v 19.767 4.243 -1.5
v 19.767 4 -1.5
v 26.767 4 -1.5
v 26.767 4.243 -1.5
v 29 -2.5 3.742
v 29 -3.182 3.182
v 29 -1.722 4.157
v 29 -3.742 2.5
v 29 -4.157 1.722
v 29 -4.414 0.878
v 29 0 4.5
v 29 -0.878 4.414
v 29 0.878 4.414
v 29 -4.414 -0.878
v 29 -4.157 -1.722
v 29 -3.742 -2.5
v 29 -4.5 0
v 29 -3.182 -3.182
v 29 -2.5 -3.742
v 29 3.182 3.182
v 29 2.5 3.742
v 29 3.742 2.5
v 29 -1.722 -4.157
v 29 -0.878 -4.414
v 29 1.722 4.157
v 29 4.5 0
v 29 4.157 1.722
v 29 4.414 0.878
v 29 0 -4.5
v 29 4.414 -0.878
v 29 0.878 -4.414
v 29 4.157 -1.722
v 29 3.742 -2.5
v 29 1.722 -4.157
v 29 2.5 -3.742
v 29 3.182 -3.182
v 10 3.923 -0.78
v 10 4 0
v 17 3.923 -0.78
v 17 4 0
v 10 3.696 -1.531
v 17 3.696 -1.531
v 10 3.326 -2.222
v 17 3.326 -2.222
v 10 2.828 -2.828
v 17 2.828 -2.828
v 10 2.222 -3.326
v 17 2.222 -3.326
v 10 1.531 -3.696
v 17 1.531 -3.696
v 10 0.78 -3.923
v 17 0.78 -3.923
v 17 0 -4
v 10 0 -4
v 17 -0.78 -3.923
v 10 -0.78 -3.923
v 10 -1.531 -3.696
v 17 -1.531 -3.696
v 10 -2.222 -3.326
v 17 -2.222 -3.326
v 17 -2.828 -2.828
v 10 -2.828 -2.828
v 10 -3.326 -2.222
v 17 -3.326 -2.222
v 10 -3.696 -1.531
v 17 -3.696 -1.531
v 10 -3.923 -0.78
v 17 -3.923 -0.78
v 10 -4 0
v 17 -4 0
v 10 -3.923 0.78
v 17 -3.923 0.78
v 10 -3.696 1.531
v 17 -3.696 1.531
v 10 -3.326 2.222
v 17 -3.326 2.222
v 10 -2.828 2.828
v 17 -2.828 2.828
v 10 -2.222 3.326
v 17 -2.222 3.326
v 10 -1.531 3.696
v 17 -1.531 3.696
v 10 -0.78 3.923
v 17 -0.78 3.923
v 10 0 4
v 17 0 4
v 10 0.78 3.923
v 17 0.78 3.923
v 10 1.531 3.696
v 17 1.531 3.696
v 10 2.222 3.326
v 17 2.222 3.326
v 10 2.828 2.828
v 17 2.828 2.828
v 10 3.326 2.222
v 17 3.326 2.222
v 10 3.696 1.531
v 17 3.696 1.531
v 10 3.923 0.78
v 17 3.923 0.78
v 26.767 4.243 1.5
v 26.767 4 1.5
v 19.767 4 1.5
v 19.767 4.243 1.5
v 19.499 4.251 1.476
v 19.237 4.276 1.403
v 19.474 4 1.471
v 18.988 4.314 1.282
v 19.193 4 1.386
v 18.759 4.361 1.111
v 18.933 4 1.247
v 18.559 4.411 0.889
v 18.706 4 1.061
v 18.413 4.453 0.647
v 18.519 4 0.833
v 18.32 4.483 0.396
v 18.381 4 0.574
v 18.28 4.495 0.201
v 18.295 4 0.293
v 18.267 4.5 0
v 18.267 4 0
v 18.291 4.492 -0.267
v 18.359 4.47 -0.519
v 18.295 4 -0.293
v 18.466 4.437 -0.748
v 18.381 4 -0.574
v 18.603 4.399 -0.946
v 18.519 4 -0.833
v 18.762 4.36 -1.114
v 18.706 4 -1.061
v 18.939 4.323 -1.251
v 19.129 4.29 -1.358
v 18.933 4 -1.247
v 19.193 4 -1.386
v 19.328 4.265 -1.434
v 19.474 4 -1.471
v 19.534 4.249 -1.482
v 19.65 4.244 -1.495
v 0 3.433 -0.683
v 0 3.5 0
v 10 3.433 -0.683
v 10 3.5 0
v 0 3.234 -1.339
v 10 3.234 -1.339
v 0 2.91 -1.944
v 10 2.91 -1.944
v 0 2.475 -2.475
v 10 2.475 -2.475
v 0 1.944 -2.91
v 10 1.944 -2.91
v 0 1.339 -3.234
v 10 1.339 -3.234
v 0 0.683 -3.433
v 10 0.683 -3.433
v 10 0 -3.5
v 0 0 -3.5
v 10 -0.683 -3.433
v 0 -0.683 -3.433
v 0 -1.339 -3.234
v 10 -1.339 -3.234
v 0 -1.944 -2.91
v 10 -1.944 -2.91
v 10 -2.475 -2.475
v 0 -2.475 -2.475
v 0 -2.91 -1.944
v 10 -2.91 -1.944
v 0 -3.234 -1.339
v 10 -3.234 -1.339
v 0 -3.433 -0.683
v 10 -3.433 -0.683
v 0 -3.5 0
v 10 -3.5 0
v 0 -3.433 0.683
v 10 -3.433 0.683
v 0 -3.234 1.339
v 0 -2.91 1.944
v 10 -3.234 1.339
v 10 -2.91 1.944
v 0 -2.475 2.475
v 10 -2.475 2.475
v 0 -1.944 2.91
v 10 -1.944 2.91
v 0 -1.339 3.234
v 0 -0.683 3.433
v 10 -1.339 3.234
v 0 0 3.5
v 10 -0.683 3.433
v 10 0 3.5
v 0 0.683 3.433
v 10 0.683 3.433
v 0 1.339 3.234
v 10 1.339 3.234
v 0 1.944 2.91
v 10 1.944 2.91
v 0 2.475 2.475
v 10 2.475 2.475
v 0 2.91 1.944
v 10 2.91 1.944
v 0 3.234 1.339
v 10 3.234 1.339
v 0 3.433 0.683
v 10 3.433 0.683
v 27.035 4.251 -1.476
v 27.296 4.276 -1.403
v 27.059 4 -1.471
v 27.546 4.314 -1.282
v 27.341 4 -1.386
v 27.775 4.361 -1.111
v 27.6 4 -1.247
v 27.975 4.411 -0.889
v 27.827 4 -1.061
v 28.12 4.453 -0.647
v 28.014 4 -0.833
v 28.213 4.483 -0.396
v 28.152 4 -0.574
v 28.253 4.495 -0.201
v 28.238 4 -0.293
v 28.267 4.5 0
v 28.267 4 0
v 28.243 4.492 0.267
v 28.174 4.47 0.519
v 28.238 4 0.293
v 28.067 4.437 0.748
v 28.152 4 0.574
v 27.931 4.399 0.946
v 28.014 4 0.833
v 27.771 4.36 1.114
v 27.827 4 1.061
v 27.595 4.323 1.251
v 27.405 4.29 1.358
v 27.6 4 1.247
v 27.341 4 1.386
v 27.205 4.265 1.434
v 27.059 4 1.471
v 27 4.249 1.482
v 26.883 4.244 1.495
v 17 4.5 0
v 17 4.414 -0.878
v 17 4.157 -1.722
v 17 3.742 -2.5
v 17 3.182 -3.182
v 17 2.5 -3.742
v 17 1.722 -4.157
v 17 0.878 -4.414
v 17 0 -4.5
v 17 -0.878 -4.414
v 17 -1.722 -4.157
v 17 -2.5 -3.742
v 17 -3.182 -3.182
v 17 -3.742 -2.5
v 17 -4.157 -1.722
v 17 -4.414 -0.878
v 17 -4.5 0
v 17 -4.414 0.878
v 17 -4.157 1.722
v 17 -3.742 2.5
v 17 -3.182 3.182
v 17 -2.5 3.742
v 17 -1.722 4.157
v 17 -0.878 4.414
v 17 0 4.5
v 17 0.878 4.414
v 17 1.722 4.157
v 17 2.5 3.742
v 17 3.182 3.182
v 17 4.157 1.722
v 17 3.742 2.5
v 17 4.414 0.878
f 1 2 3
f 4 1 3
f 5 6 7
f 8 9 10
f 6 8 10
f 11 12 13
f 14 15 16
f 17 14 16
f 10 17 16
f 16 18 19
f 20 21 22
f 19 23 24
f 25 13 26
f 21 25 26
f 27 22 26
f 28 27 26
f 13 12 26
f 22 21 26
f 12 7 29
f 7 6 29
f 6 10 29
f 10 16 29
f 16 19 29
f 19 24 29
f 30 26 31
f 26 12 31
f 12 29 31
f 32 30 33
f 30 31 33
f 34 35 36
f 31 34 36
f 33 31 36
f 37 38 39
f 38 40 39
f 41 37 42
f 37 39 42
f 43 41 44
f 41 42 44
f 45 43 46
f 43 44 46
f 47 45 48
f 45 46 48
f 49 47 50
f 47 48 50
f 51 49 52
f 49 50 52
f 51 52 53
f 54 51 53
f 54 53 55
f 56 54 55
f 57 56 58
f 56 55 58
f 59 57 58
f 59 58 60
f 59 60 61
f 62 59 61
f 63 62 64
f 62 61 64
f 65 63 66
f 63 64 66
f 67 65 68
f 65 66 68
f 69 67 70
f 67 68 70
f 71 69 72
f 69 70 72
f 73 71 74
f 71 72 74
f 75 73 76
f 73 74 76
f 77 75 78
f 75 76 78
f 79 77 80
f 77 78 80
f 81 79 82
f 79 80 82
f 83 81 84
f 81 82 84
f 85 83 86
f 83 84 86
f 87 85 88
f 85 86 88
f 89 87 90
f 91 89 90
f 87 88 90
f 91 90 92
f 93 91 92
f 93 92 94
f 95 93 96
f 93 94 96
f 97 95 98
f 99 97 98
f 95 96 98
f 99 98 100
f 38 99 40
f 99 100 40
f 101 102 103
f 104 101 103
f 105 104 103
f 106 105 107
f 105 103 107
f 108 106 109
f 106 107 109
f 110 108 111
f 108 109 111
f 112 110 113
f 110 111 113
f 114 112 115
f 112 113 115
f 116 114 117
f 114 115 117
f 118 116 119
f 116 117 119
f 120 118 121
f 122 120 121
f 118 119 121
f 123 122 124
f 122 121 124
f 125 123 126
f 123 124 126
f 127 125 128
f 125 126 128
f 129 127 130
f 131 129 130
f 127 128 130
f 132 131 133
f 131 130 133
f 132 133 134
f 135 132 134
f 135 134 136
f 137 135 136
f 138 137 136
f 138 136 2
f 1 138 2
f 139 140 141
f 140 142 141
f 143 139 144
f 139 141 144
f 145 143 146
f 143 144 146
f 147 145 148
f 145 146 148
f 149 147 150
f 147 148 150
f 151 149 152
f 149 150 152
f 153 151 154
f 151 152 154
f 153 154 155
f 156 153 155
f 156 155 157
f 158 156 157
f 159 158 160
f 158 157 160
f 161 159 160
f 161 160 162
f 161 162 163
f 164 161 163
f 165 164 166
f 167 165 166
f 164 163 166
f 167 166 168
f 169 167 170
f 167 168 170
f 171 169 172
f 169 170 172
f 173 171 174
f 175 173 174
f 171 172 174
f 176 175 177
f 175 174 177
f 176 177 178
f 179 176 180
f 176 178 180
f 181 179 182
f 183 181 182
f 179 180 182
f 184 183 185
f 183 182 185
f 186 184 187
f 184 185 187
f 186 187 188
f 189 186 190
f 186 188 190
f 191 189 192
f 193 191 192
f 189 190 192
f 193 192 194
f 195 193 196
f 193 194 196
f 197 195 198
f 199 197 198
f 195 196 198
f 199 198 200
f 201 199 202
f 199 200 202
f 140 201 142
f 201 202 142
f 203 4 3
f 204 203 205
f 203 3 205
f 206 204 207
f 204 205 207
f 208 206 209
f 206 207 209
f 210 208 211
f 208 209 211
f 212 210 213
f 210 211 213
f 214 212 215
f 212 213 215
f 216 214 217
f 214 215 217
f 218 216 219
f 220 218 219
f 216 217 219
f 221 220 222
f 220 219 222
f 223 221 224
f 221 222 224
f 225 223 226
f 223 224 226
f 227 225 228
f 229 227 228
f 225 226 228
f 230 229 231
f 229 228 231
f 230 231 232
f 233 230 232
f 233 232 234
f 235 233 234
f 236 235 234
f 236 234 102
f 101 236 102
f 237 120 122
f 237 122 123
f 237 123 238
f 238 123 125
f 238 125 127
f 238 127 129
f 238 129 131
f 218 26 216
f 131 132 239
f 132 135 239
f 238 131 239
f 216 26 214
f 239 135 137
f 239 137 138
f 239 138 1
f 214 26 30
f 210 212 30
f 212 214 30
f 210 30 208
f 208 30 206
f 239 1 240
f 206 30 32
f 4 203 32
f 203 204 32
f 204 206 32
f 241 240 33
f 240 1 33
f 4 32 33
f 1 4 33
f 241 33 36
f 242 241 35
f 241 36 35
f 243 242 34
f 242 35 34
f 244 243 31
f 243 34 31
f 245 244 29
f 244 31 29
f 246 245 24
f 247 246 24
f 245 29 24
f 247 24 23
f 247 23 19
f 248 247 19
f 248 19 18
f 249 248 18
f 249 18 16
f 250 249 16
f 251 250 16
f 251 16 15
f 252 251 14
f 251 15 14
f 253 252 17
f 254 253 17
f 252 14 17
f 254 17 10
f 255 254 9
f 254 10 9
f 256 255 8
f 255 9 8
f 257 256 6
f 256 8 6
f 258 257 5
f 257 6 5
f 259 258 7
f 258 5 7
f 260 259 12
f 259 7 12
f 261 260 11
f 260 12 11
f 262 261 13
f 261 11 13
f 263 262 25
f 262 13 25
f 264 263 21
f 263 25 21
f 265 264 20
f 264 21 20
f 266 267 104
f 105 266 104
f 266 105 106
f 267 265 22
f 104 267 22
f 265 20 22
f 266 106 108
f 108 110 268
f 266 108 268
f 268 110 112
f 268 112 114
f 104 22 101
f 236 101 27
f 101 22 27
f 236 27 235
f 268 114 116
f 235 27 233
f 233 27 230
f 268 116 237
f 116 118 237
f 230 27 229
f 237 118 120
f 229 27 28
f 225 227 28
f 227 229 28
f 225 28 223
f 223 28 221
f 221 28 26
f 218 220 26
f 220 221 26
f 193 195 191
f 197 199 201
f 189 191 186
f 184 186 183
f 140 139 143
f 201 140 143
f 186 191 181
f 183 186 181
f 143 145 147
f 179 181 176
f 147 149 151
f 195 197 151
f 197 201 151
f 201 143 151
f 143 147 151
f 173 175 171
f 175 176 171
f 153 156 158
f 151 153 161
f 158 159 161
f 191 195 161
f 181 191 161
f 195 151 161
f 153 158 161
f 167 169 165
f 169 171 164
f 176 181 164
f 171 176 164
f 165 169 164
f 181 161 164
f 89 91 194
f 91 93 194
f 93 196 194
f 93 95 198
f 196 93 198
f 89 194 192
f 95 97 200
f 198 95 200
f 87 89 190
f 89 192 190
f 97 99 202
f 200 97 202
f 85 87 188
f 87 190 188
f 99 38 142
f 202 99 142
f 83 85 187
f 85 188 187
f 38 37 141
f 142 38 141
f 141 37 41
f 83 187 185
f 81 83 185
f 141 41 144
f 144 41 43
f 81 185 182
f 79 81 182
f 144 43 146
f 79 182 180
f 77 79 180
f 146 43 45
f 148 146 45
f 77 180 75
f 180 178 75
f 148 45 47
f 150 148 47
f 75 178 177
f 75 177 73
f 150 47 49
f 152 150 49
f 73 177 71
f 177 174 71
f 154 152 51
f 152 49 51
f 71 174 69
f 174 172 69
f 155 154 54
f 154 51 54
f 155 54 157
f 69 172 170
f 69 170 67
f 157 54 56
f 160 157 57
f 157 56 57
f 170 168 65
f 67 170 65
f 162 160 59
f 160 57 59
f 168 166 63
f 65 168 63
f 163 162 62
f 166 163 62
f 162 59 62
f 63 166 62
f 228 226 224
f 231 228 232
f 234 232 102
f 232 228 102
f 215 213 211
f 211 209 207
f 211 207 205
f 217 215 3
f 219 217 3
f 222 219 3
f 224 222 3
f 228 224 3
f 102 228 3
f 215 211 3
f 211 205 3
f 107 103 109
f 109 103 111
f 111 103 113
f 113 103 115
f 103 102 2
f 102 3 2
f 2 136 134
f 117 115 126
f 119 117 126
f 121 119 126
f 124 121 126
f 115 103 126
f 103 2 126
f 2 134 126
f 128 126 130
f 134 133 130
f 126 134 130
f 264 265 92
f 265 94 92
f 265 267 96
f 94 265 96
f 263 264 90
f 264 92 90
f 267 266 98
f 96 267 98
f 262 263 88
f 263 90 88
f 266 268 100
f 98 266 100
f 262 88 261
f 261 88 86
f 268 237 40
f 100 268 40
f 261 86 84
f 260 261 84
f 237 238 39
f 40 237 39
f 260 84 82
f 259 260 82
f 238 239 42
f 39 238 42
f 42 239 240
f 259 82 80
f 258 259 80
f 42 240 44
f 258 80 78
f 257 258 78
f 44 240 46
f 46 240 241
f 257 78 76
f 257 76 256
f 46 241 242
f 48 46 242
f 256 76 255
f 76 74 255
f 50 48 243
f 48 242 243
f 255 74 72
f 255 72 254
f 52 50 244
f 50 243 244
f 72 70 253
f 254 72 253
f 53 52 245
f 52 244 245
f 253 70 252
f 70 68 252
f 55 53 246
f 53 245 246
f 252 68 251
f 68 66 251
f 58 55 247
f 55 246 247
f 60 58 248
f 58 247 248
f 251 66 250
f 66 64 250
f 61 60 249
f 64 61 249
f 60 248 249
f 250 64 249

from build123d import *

# Parameters (mm, degrees)
CUT_EXTRUDE1_START = 4
CUT_EXTRUDE1_DEPTH = 10


with BuildPart() as part:
    # Sketch1 → Revolve1 (revolve)
    with BuildSketch(Plane.XY):
        Polygon((0, 0), (0, 3.5), (10, 3.5), (10, 4), (17, 4), (17, 4.5), (29, 4.5), (29, 0), align=None)
    revolve(axis=Axis((29, 0, 0), (-1, 0, 0)))

    # Sketch2 → Cut-Extrude1 (cut)
    with BuildSketch(Plane(origin=(0, 0, 0), x_dir=(1, 0, 0), z_dir=(0, 1, 0)).offset(CUT_EXTRUDE1_START)):
        with BuildLine():
            Line((19.76662124, 1.5), (26.76662124, 1.5))
            ThreePointArc((26.76662124, 1.5), (28.26662124, 0), (26.76662124, -1.5))
            Line((26.76662124, -1.5), (19.76662124, -1.5))
            ThreePointArc((19.76662124, -1.5), (18.26662124, 0), (19.76662124, 1.5))
        make_face()
    extrude(amount=CUT_EXTRUDE1_DEPTH, mode=Mode.SUBTRACT)


solid = part.part
